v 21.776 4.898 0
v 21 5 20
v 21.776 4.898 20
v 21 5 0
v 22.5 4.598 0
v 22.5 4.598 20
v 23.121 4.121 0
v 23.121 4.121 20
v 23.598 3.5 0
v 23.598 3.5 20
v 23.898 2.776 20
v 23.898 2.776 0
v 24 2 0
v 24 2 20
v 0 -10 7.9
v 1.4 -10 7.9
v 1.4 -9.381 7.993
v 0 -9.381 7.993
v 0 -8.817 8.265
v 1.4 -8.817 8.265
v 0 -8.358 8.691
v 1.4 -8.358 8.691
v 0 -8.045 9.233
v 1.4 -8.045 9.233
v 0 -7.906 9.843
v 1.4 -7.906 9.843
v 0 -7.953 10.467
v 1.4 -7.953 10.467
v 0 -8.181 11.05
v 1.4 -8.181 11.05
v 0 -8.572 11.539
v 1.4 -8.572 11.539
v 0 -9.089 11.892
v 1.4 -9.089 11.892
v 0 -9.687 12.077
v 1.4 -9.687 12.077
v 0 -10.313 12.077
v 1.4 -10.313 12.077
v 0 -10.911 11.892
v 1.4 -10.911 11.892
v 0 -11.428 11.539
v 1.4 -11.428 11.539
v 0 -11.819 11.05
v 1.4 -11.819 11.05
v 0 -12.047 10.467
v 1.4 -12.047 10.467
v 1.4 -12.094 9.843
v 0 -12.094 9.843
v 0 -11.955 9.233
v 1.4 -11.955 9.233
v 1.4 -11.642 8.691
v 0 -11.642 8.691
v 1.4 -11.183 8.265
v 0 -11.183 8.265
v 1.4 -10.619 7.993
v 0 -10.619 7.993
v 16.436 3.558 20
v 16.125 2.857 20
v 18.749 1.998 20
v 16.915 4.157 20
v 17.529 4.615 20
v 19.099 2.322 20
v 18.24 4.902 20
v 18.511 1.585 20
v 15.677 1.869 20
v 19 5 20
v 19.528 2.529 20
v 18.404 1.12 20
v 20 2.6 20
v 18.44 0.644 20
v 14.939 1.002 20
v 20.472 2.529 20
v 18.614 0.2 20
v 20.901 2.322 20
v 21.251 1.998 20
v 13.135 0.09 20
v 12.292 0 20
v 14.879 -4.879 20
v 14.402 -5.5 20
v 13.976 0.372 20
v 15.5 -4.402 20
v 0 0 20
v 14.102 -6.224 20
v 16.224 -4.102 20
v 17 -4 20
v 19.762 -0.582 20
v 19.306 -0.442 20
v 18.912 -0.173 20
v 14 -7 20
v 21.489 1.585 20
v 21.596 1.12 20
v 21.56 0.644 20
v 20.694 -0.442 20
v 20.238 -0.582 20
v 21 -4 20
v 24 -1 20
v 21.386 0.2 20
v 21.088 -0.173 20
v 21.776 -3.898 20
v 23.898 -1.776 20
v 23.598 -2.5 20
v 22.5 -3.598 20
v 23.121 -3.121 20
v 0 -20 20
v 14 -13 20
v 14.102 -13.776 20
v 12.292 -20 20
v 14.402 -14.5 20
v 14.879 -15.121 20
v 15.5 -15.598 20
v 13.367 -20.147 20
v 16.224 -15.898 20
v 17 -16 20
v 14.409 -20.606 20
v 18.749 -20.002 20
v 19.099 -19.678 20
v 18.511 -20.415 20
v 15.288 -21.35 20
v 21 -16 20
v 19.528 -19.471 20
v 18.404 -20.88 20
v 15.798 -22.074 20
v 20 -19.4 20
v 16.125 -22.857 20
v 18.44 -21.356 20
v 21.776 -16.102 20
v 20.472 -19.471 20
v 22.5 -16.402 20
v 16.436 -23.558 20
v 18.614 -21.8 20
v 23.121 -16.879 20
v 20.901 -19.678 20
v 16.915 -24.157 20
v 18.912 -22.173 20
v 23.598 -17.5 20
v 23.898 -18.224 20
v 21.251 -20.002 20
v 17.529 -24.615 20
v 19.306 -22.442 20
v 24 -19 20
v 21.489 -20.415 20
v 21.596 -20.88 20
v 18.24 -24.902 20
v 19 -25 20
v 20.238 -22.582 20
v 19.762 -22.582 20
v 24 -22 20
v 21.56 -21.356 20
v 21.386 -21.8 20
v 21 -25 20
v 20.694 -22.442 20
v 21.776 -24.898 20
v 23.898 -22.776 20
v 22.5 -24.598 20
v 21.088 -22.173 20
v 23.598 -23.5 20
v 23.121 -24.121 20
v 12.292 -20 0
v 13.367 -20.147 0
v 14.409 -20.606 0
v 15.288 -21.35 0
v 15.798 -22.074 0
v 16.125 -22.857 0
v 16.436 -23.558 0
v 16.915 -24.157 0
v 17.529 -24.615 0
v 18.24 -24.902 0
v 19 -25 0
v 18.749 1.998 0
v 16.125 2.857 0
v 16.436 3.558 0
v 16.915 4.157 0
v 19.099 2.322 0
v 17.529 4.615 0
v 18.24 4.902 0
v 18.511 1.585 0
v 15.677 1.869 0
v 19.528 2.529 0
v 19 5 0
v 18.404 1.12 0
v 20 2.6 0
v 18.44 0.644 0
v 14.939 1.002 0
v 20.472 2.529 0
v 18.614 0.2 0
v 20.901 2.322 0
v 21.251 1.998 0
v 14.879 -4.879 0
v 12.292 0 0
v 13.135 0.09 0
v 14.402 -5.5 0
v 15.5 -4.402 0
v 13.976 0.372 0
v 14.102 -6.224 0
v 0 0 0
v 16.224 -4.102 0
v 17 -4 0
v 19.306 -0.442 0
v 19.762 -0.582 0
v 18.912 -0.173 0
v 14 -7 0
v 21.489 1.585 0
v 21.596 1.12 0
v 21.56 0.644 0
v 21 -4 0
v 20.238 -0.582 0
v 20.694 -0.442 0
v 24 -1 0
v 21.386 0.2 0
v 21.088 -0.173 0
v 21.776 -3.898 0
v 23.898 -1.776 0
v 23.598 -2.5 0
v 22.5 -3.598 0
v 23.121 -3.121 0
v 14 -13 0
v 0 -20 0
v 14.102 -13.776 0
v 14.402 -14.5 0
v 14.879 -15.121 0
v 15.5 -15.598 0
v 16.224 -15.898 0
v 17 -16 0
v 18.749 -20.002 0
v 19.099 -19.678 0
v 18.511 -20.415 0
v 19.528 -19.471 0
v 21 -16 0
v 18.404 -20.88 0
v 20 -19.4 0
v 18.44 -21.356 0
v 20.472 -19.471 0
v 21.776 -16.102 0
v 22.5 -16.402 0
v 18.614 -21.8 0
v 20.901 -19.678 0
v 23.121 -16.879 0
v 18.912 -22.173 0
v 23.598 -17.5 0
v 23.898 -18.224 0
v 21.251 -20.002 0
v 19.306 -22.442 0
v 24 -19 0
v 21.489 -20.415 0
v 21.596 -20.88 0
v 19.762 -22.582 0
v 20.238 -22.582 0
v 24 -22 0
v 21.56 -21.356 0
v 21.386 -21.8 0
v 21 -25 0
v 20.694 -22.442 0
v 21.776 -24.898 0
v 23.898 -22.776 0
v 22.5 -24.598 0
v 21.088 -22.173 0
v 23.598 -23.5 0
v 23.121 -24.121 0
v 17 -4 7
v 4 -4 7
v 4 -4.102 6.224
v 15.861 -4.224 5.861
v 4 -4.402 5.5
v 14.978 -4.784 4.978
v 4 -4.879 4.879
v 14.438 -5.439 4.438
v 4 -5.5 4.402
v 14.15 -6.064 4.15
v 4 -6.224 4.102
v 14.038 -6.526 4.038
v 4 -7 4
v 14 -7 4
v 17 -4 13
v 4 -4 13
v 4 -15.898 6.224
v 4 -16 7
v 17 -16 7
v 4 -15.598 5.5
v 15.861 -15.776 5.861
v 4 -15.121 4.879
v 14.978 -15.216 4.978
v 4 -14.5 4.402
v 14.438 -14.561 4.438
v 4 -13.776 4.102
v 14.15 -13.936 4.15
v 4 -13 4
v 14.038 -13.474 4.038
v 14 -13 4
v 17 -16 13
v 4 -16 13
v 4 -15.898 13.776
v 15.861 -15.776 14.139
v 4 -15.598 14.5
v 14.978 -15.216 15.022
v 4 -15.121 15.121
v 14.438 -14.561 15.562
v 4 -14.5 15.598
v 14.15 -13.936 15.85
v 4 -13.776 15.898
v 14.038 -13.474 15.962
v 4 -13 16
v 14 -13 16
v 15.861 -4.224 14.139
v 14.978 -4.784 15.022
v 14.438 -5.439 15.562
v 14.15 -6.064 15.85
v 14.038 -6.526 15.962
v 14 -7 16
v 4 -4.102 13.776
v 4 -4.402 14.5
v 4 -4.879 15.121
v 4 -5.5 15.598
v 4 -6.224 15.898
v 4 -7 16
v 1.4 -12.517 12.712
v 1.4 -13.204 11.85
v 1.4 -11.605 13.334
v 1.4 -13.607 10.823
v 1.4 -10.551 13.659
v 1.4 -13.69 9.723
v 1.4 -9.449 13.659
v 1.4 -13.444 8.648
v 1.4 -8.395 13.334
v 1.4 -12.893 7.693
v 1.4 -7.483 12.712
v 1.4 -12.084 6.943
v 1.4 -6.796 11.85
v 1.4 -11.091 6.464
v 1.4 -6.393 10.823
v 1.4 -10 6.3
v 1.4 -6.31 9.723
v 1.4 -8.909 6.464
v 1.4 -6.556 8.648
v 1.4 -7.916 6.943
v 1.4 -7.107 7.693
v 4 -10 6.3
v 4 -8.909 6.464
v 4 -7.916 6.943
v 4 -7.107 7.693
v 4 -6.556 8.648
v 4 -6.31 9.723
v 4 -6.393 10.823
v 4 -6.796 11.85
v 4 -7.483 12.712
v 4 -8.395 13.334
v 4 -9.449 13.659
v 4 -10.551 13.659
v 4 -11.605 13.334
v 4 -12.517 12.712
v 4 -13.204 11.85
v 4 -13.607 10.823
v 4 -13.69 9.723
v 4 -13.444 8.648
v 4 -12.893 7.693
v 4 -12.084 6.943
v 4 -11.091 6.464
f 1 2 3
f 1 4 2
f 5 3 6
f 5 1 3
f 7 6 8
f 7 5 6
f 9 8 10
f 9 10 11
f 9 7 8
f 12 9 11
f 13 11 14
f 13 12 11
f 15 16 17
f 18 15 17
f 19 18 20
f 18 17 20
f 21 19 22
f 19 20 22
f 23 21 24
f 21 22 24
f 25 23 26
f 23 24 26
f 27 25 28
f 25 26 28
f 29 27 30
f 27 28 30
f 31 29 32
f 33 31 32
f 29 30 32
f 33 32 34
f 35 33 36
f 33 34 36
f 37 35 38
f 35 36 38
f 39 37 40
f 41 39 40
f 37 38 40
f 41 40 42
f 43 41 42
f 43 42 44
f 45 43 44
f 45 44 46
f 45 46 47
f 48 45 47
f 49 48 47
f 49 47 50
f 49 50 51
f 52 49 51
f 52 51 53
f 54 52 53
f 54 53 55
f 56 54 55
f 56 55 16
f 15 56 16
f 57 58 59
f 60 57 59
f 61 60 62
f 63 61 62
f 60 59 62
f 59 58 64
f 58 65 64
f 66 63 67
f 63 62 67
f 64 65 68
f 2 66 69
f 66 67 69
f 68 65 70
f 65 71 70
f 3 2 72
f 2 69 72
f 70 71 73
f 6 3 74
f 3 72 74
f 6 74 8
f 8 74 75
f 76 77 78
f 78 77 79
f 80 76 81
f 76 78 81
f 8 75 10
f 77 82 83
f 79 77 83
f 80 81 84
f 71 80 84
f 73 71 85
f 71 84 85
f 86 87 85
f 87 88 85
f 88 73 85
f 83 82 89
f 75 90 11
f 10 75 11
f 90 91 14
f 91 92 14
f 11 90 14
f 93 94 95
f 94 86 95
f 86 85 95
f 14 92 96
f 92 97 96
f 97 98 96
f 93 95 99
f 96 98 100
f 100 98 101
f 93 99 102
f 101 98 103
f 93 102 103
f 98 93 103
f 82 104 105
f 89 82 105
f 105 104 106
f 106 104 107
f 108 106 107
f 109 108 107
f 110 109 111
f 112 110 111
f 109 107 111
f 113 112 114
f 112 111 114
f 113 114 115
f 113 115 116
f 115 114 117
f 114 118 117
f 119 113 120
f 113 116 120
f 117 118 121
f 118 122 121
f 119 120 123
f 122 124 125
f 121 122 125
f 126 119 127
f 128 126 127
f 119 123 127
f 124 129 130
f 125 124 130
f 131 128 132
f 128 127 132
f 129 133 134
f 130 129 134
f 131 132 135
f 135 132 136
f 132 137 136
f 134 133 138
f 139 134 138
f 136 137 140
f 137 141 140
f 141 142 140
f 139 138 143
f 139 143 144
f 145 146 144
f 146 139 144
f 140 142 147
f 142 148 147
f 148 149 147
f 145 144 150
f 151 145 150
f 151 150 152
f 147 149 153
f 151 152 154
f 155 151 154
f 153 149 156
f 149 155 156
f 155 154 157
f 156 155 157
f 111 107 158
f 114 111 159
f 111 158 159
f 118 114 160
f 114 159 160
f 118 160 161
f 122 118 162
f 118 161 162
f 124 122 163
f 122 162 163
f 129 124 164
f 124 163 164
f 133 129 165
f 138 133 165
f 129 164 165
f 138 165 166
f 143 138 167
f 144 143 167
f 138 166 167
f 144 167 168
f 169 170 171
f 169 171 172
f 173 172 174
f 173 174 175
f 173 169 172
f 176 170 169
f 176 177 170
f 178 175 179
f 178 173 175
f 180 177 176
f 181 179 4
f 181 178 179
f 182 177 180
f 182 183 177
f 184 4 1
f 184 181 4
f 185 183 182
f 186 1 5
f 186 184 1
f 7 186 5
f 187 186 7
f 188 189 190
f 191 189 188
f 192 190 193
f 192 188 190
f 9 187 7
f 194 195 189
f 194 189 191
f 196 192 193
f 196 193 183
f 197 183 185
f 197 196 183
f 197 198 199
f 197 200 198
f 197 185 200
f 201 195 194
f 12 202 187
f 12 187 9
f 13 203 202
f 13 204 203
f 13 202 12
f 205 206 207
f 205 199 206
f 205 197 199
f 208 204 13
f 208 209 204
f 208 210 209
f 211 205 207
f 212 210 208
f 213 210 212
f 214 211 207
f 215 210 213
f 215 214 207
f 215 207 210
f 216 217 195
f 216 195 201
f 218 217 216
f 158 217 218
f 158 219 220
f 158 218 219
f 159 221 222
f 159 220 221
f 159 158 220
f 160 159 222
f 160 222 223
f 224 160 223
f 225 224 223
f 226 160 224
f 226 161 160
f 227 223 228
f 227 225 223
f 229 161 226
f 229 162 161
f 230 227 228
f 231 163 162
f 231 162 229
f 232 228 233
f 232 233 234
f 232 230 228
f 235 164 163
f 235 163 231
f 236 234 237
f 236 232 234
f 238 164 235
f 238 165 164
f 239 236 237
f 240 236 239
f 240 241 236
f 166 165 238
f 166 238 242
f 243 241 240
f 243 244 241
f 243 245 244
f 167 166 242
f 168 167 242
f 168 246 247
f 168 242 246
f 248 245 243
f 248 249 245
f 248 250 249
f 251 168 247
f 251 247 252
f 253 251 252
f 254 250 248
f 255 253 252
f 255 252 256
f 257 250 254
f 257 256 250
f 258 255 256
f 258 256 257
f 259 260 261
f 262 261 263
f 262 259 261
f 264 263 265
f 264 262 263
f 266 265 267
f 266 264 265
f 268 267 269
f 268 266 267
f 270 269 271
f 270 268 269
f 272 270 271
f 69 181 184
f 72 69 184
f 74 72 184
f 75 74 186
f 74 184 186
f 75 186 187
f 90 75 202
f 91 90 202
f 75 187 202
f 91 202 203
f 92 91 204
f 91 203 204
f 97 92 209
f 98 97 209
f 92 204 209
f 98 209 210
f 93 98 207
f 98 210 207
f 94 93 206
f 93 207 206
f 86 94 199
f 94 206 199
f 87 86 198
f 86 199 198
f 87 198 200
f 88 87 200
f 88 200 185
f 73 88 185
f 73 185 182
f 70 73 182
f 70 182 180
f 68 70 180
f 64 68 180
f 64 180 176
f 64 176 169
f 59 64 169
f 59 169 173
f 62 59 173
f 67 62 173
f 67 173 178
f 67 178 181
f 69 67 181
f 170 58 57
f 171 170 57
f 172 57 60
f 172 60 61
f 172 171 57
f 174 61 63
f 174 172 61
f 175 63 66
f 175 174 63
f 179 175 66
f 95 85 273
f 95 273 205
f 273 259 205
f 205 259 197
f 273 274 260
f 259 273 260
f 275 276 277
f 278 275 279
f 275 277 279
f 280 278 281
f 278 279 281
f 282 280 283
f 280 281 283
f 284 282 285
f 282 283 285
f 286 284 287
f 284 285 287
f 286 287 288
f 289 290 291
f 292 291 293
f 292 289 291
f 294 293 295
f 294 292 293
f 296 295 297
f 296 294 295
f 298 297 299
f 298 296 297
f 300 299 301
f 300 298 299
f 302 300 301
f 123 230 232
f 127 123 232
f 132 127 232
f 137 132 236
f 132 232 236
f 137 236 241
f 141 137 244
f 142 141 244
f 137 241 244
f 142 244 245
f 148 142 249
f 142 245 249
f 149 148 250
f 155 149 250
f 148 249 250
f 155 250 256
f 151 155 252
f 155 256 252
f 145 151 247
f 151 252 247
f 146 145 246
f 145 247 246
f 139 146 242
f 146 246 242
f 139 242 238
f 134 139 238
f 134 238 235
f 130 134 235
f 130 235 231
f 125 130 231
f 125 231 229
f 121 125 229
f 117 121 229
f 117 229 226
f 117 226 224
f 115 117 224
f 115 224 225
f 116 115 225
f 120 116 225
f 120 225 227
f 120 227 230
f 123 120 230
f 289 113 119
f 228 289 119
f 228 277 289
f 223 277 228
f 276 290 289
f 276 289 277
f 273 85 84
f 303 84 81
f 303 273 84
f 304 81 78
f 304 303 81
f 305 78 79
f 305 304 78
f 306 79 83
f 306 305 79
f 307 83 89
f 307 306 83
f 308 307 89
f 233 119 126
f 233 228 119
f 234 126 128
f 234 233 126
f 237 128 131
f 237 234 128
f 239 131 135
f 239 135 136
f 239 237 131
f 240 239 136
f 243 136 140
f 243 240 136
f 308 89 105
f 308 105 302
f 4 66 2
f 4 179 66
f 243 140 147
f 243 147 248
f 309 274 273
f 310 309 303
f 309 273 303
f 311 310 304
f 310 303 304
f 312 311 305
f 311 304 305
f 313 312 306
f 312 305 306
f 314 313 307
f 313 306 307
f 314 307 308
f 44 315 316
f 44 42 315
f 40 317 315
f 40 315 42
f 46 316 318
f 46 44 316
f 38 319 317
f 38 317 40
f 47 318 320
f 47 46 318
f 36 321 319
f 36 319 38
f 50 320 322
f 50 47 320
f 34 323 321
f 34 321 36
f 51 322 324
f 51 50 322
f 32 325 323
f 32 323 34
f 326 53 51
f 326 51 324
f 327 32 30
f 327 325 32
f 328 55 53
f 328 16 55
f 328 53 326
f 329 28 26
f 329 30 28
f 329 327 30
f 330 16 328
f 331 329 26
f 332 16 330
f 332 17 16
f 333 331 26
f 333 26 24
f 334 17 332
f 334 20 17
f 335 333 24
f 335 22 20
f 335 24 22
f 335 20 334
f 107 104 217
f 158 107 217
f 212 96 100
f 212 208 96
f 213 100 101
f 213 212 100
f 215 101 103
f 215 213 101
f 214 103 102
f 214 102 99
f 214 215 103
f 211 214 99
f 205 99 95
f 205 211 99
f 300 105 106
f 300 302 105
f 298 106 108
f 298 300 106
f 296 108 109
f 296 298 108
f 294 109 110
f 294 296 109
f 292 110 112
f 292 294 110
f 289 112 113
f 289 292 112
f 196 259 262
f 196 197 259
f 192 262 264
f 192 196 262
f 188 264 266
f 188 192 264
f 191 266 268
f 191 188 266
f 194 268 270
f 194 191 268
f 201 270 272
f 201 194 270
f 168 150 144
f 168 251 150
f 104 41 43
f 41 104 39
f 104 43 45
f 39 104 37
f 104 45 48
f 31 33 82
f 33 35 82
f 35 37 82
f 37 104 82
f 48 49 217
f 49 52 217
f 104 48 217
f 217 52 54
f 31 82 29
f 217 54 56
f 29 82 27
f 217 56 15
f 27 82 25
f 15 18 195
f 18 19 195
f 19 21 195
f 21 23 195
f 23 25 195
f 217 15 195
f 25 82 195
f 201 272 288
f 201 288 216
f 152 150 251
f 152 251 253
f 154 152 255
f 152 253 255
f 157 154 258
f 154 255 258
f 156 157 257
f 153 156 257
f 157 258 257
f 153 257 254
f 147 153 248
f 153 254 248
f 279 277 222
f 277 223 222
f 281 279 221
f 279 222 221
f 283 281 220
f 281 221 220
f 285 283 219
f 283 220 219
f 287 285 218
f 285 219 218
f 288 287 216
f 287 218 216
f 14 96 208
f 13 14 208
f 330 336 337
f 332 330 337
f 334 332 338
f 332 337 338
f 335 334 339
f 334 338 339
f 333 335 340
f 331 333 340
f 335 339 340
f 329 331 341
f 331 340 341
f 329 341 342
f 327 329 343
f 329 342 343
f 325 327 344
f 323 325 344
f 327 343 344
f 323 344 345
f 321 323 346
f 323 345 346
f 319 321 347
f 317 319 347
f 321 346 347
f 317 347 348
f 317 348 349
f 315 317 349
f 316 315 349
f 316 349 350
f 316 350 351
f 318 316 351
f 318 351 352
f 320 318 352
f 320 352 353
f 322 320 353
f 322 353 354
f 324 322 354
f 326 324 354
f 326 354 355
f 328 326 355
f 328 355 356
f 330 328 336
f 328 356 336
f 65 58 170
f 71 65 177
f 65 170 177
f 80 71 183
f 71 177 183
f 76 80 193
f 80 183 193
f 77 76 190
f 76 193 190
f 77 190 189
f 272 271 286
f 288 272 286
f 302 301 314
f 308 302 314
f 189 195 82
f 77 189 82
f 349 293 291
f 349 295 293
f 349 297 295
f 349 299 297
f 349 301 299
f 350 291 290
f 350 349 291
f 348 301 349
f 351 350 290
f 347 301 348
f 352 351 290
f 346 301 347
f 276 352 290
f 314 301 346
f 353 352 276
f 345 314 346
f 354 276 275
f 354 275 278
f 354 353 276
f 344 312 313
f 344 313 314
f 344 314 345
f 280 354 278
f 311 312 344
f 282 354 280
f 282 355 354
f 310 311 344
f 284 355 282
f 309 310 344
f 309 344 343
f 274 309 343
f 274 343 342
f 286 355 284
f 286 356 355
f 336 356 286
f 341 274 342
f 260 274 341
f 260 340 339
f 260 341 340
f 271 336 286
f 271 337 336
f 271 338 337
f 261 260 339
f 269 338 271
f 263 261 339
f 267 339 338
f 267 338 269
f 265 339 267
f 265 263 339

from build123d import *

# Parameters (mm, degrees)
SKETCH1_W           = 20
SKETCH1_H           = 20
BOSS_EXTRUDE1_DEPTH = 4
SKETCH2_R           = 3.7
CUT_EXTRUDE1_DEPTH  = 2.6
SKETCH3_R           = 2.1
CUT_EXTRUDE2_DEPTH  = 29.403520909
SKETCH4_W           = 12
SKETCH4_H           = 4
BOSS_EXTRUDE2_DEPTH = 10
SKETCH7_W           = 20
SKETCH7_H           = 4
BOSS_EXTRUDE3_DEPTH = 10
SKETCH8_W           = 8
SKETCH8_H           = 20
BOSS_EXTRUDE4_DEPTH = 5
SKETCH9_W           = 8
SKETCH9_H           = 20
BOSS_EXTRUDE5_DEPTH = 5
SKETCH10_R          = 1.6
CUT_EXTRUDE5_DEPTH  = 41.012498047
FILLET6_R           = 3
FILLET7_R           = 3
FILLET8_R           = 4


with BuildPart() as part:
    # Sketch1 → Boss-Extrude1 (new body)
    with BuildSketch(Plane(origin=(0, 0, 0), x_dir=(0, 0, -1), z_dir=(1, 0, 0))):
        with Locations((-10, -10)):
            Rectangle(SKETCH1_W, SKETCH1_H)
    extrude(amount=BOSS_EXTRUDE1_DEPTH)

    # Sketch2 → Cut-Extrude1 (cut)
    with BuildSketch(Plane(origin=(4, 0, 0), x_dir=(0, 0, -1), z_dir=(1, 0, 0))):
        with Locations((-10, -10)):
            Circle(SKETCH2_R)
    extrude(amount=-CUT_EXTRUDE1_DEPTH, mode=Mode.SUBTRACT)

    # Sketch3 → Cut-Extrude2 (cut, through all)
    with BuildSketch(Plane(origin=(1.4, 0, 0), x_dir=(0, 0, -1), z_dir=(1, 0, 0))):
        with Locations((-10, -10)):
            Circle(SKETCH3_R)
    extrude(amount=-CUT_EXTRUDE2_DEPTH, mode=Mode.SUBTRACT)

    # Sketch4 → Boss-Extrude2 (add)
    with BuildSketch(Plane(origin=(4, 0, 0), x_dir=(0, 0, -1), z_dir=(1, 0, 0))):
        Polygon((-20, 0), (-20, -20), (-16, -20), (-16, -16), (-16, -4), (-16, 0), align=None)
        with Locations((-10, -18)):
            Rectangle(SKETCH4_W, SKETCH4_H)
        Polygon((-4, -16), (-4, -20), (0, -20), (0, -4), (-4, -4), align=None)
        Polygon((0, 0), (-16, 0), (-16, -4), (-4, -4), (0, -4), align=None)
    extrude(amount=BOSS_EXTRUDE2_DEPTH)

    # Sketch7 → Boss-Extrude3 (add)
    with BuildSketch(Plane(origin=(14, 0, 0), x_dir=(0, 0, -1), z_dir=(1, 0, 0))):
        with Locations((-10, -18)):
            Rectangle(SKETCH7_W, SKETCH7_H)
        with Locations((-10, -2)):
            Rectangle(SKETCH7_W, SKETCH7_H)
    extrude(amount=BOSS_EXTRUDE3_DEPTH)

    # Sketch8 → Boss-Extrude4 (add)
    with BuildSketch(Plane(origin=(0, -20, 0), x_dir=(-1, 0, 0), z_dir=(0, -1, 0))):
        with Locations((-20, -10)):
            Rectangle(SKETCH8_W, SKETCH8_H)
    extrude(amount=BOSS_EXTRUDE4_DEPTH)

    # Sketch9 → Boss-Extrude5 (add)
    with BuildSketch(Plane(origin=(0, 0, 0), x_dir=(1, 0, 0), z_dir=(0, 1, 0))):
        with Locations((20, -10)):
            Rectangle(SKETCH9_W, SKETCH9_H)
    extrude(amount=BOSS_EXTRUDE5_DEPTH)

    # Sketch10 → Cut-Extrude5 (cut, through all)
    with BuildSketch(Plane(origin=(0, 0, 0), x_dir=(-1, 0, 0), z_dir=(0, 0, -1))):
        with Locations(Location((-20, 1, 0), (0, 0, 90))):
            Circle(SKETCH10_R)
        with Locations(Location((-20, -21, 0), (0, 0, 90))):
            Circle(SKETCH10_R)
    extrude(amount=-CUT_EXTRUDE5_DEPTH, mode=Mode.SUBTRACT)

    # Fillet6
    fillet6_edges = [part.edges().sort_by_distance(p)[0] for p in [
        (24, -16, 10),
        (24, -4, 10),
        (24, -25, 10),
        (16, -25, 10),
        (24, 5, 10),
        (16, 5, 10),
    ]]
    fillet(fillet6_edges, radius=FILLET6_R)

    # Fillet7
    fillet7_edges = [part.edges().sort_by_distance(p)[0] for p in [
        (9, -4, 16),
        (9, -4, 4),
        (9, -16, 4),
        (9, -16, 16),
        (14, -16, 18),
        (14, -16, 2),
        (14, -4, 2),
        (14, -4, 18),
    ]]
    fillet(fillet7_edges, radius=FILLET7_R)

    # Fillet8
    fillet8_edges = [part.edges().sort_by_distance(p)[0] for p in [
        (16, -20, 10),
        (16, 0, 10),
    ]]
    fillet(fillet8_edges, radius=FILLET8_R)


solid = part.part
